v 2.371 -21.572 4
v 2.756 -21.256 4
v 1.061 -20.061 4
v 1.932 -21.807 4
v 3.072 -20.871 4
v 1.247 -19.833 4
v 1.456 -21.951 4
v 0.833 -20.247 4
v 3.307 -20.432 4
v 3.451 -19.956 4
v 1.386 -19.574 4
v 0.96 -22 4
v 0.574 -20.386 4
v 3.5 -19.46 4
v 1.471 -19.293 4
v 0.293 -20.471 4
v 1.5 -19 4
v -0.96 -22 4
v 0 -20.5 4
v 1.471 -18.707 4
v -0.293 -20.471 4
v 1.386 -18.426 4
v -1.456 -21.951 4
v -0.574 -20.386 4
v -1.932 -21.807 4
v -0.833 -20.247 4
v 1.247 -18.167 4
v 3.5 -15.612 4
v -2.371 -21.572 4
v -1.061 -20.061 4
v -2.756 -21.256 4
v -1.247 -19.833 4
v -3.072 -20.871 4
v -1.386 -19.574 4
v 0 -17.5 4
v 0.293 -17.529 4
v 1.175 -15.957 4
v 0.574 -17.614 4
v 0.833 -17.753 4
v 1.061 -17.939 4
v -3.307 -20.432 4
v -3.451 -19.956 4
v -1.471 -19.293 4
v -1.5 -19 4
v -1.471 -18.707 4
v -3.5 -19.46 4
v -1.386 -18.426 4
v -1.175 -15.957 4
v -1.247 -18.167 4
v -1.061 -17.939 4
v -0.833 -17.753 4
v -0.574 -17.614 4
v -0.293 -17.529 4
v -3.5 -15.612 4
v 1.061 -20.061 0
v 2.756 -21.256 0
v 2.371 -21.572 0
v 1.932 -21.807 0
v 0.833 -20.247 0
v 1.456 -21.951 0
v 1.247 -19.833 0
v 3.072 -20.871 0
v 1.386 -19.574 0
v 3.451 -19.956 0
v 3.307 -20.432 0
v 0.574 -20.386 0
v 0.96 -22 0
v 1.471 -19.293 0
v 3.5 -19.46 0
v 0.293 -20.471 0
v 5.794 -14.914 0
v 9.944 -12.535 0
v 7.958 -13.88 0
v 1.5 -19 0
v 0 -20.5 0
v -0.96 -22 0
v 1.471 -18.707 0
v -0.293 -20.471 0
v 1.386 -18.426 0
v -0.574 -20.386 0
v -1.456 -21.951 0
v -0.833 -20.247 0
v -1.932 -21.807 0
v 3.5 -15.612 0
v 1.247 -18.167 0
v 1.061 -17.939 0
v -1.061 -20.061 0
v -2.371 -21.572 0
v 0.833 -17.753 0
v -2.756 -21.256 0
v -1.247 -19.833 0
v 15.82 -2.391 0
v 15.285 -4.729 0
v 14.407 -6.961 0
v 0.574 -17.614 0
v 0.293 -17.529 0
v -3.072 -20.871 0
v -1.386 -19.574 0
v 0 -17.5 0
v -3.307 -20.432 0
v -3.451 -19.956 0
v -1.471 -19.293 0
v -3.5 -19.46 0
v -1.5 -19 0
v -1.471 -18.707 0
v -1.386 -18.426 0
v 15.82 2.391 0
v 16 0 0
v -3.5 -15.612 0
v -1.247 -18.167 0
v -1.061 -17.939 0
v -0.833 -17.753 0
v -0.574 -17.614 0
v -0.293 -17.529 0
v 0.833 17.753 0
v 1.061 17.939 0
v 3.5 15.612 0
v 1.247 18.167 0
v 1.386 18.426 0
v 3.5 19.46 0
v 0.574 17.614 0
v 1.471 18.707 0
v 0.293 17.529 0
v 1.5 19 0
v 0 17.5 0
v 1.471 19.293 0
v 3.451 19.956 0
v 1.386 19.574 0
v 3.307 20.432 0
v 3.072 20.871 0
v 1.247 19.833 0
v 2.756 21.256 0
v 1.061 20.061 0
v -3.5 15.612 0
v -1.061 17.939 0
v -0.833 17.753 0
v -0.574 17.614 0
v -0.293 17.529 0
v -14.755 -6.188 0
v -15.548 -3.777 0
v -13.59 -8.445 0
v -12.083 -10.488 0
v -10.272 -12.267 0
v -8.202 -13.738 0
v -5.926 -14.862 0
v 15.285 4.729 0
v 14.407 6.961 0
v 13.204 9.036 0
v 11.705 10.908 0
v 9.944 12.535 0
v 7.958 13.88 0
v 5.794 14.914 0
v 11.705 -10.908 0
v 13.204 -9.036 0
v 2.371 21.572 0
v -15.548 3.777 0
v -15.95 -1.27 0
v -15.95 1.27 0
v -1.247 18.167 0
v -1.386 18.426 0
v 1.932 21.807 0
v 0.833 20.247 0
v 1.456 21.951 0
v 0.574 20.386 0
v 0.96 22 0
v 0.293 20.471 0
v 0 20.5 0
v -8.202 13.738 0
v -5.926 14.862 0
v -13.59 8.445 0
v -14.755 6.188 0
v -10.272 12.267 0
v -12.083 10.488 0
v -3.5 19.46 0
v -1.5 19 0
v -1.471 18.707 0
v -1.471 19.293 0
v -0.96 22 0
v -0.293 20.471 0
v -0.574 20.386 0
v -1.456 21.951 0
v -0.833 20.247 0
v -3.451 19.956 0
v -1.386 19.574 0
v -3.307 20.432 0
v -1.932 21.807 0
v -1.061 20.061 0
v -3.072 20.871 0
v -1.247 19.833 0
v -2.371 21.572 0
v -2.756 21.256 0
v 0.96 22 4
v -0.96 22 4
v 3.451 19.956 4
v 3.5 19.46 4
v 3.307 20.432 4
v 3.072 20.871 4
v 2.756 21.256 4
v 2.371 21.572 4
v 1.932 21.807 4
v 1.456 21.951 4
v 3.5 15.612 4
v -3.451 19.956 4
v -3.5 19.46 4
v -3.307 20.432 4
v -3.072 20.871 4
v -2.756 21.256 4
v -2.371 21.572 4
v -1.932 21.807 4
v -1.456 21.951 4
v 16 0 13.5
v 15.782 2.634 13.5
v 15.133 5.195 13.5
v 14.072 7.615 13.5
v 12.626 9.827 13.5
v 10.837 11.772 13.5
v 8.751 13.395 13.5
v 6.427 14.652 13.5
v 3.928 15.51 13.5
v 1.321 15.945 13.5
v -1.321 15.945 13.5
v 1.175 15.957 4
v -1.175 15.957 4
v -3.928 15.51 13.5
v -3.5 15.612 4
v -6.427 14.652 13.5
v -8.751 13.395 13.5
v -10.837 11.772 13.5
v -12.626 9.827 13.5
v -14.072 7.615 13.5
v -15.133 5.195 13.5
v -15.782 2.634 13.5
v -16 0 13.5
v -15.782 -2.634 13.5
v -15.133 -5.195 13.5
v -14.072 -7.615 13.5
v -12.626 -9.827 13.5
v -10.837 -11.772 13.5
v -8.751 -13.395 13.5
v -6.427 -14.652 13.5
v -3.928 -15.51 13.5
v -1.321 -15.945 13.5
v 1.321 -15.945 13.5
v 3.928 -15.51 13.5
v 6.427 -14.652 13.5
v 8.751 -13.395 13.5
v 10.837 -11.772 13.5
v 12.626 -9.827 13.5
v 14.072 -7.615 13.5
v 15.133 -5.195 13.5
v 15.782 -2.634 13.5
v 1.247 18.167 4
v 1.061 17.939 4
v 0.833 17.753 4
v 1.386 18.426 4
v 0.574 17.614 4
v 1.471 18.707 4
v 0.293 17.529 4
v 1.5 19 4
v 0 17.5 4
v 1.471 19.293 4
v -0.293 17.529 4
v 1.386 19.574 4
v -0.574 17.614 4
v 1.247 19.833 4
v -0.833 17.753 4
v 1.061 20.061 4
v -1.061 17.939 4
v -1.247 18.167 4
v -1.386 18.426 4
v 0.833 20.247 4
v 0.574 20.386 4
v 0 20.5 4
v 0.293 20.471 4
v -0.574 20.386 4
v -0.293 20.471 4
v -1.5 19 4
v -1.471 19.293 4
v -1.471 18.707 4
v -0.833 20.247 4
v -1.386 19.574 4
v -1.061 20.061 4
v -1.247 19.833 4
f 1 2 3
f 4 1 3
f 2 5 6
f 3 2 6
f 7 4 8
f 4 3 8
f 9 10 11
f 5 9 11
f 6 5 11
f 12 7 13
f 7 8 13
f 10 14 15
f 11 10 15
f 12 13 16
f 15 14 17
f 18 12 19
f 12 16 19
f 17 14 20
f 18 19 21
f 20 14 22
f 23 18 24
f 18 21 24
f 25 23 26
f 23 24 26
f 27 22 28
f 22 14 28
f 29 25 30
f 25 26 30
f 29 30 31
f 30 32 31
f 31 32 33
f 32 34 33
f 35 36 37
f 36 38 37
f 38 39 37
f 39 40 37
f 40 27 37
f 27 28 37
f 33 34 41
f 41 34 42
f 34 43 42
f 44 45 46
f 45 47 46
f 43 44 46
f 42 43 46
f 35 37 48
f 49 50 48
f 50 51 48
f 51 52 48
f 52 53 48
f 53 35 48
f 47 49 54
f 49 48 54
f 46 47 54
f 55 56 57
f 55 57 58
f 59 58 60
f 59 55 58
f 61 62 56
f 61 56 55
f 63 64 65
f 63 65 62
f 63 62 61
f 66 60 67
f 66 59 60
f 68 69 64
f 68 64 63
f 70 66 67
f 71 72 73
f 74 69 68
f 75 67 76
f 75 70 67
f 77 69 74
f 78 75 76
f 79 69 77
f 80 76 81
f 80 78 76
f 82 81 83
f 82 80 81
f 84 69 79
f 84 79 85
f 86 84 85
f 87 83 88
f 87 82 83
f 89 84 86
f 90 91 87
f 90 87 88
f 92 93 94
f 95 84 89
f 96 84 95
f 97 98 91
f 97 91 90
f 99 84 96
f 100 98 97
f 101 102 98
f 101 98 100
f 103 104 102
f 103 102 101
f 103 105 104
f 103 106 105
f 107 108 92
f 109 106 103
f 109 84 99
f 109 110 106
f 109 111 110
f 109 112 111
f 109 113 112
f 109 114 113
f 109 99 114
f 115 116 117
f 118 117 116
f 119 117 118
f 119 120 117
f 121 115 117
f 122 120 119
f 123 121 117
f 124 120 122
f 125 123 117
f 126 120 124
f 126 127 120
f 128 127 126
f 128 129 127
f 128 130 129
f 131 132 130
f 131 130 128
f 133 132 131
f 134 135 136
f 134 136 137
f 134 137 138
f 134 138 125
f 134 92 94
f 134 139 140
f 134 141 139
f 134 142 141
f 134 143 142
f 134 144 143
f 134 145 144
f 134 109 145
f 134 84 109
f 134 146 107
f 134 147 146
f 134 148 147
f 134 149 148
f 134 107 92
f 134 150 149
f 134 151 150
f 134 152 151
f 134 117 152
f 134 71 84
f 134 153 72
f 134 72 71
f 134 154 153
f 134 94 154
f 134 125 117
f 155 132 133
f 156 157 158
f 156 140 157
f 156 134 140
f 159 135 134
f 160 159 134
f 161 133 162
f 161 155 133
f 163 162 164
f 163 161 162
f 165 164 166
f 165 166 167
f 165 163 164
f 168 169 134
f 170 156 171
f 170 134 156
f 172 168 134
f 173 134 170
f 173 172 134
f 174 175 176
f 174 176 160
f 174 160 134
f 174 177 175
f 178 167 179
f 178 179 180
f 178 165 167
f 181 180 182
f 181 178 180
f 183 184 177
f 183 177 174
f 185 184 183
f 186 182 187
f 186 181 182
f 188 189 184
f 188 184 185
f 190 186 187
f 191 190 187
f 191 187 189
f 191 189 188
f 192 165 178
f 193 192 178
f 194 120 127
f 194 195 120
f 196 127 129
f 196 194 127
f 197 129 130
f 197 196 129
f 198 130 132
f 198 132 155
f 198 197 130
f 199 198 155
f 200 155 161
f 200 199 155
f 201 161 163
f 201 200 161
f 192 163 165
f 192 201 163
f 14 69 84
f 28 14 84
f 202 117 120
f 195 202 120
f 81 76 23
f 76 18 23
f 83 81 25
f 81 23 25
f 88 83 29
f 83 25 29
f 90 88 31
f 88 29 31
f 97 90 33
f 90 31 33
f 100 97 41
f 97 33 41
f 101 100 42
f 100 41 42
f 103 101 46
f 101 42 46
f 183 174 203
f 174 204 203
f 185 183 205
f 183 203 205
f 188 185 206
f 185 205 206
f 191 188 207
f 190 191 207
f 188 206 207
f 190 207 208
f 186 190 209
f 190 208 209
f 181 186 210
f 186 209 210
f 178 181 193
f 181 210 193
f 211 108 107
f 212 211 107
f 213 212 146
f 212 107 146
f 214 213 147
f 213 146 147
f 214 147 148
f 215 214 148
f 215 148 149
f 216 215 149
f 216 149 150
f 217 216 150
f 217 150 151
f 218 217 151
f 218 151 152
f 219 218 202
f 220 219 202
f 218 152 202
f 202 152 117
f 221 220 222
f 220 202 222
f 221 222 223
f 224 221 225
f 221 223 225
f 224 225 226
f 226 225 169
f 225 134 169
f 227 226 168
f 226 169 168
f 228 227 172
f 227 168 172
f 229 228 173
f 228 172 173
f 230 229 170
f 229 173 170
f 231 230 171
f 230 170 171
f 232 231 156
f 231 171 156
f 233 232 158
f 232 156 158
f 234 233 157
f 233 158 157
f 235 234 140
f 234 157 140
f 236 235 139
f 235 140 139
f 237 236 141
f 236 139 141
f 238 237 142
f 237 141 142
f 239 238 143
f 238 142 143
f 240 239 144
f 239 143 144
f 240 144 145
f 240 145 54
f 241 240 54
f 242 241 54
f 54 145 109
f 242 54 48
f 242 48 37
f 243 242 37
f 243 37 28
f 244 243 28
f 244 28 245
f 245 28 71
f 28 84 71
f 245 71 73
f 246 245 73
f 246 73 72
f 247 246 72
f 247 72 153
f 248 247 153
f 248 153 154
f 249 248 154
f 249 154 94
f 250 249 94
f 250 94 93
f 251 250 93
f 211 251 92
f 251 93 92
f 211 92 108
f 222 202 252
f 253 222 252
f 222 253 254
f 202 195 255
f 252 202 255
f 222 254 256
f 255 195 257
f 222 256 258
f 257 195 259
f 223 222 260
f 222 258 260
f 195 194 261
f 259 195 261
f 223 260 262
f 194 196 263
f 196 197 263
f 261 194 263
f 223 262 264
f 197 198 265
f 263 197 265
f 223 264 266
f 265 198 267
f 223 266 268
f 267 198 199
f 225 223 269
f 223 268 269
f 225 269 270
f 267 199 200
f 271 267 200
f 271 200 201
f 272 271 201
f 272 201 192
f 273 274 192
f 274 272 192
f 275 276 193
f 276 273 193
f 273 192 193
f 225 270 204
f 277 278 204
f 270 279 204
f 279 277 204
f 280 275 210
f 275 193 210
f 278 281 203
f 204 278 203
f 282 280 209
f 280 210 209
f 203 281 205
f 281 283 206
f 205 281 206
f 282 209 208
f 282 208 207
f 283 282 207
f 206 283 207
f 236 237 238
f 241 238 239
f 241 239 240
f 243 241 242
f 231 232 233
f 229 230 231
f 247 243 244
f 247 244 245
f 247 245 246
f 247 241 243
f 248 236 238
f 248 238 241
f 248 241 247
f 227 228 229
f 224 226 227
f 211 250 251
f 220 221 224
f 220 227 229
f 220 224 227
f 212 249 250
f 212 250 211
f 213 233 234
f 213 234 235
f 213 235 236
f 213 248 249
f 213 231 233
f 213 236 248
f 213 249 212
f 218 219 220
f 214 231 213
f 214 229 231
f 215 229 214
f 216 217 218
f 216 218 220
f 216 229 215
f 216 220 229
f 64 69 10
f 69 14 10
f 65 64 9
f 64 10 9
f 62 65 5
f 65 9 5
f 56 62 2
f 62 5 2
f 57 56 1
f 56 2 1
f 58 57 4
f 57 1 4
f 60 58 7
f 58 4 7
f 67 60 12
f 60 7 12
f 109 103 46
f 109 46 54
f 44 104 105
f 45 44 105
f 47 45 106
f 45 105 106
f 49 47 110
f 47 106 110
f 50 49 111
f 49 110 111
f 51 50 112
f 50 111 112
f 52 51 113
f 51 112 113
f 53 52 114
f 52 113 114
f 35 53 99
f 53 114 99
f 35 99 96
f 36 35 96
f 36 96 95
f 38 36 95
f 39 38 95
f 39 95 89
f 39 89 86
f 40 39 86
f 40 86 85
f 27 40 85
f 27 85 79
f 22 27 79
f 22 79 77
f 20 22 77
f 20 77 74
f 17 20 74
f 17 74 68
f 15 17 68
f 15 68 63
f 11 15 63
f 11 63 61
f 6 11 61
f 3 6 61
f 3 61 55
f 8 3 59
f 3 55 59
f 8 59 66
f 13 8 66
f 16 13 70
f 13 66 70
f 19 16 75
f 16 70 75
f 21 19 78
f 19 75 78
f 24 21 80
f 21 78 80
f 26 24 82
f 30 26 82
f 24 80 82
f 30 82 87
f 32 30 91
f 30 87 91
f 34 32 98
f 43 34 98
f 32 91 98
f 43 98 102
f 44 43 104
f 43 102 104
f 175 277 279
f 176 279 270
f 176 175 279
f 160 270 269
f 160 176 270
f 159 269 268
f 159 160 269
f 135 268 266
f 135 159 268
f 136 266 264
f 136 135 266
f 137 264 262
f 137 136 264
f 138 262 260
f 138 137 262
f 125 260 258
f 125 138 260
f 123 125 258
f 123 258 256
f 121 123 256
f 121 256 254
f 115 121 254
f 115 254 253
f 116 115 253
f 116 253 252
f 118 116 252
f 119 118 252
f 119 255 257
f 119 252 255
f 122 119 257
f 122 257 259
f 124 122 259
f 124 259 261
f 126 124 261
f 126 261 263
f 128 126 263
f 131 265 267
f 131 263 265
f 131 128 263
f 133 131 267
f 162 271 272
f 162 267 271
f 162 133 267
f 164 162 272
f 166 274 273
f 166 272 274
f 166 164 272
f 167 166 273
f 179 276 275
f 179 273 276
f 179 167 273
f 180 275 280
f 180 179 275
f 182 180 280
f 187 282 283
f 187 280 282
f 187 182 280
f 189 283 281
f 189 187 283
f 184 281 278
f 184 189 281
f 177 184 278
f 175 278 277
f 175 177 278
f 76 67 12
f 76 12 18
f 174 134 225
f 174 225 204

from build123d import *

# Parameters (mm, degrees)
SKETCH1_R           = 16
BOSS_EXTRUDE1_DEPTH = 13.5
SKETCH2_W           = 7
SKETCH2_H           = 44
BOSS_EXTRUDE2_DEPTH = 4
FILLET1_R           = 2.54
SKETCH4_R           = 1.5
CUT_EXTRUDE1_DEPTH  = 31.368569278


with BuildPart() as part:
    # Sketch1 → Boss-Extrude1 (new body)
    with BuildSketch(Plane.XY):
        Circle(SKETCH1_R)
    extrude(amount=BOSS_EXTRUDE1_DEPTH)

    # Sketch2 → Boss-Extrude2 (add)
    with BuildSketch(Plane(origin=(0, 0, 0), x_dir=(-1, 0, 0), z_dir=(0, 0, -1))):
        Rectangle(SKETCH2_W, SKETCH2_H)
    extrude(amount=-BOSS_EXTRUDE2_DEPTH)

    # Fillet1
    fillet1_edges = [part.edges().sort_by_distance(p)[0] for p in [
        (-3.5, 22, 2),
        (3.5, -22, 2),
        (-3.5, -22, 2),
        (3.5, 22, 2),
    ]]
    fillet(fillet1_edges, radius=FILLET1_R)

    # Sketch4 → Cut-Extrude1 (cut, through all)
    with BuildSketch(Plane(origin=(0, 0, 0), x_dir=(-1, 0, 0), z_dir=(0, 0, -1))):
        with Locations((0, -19)):
            Circle(SKETCH4_R)
    cut_extrude1 = extrude(amount=-CUT_EXTRUDE1_DEPTH, mode=Mode.SUBTRACT)

    # Mirror1: Cut-Extrude1 across plane
    add(cut_extrude1.mirror(Plane.ZX), mode=Mode.SUBTRACT)


solid = part.part
